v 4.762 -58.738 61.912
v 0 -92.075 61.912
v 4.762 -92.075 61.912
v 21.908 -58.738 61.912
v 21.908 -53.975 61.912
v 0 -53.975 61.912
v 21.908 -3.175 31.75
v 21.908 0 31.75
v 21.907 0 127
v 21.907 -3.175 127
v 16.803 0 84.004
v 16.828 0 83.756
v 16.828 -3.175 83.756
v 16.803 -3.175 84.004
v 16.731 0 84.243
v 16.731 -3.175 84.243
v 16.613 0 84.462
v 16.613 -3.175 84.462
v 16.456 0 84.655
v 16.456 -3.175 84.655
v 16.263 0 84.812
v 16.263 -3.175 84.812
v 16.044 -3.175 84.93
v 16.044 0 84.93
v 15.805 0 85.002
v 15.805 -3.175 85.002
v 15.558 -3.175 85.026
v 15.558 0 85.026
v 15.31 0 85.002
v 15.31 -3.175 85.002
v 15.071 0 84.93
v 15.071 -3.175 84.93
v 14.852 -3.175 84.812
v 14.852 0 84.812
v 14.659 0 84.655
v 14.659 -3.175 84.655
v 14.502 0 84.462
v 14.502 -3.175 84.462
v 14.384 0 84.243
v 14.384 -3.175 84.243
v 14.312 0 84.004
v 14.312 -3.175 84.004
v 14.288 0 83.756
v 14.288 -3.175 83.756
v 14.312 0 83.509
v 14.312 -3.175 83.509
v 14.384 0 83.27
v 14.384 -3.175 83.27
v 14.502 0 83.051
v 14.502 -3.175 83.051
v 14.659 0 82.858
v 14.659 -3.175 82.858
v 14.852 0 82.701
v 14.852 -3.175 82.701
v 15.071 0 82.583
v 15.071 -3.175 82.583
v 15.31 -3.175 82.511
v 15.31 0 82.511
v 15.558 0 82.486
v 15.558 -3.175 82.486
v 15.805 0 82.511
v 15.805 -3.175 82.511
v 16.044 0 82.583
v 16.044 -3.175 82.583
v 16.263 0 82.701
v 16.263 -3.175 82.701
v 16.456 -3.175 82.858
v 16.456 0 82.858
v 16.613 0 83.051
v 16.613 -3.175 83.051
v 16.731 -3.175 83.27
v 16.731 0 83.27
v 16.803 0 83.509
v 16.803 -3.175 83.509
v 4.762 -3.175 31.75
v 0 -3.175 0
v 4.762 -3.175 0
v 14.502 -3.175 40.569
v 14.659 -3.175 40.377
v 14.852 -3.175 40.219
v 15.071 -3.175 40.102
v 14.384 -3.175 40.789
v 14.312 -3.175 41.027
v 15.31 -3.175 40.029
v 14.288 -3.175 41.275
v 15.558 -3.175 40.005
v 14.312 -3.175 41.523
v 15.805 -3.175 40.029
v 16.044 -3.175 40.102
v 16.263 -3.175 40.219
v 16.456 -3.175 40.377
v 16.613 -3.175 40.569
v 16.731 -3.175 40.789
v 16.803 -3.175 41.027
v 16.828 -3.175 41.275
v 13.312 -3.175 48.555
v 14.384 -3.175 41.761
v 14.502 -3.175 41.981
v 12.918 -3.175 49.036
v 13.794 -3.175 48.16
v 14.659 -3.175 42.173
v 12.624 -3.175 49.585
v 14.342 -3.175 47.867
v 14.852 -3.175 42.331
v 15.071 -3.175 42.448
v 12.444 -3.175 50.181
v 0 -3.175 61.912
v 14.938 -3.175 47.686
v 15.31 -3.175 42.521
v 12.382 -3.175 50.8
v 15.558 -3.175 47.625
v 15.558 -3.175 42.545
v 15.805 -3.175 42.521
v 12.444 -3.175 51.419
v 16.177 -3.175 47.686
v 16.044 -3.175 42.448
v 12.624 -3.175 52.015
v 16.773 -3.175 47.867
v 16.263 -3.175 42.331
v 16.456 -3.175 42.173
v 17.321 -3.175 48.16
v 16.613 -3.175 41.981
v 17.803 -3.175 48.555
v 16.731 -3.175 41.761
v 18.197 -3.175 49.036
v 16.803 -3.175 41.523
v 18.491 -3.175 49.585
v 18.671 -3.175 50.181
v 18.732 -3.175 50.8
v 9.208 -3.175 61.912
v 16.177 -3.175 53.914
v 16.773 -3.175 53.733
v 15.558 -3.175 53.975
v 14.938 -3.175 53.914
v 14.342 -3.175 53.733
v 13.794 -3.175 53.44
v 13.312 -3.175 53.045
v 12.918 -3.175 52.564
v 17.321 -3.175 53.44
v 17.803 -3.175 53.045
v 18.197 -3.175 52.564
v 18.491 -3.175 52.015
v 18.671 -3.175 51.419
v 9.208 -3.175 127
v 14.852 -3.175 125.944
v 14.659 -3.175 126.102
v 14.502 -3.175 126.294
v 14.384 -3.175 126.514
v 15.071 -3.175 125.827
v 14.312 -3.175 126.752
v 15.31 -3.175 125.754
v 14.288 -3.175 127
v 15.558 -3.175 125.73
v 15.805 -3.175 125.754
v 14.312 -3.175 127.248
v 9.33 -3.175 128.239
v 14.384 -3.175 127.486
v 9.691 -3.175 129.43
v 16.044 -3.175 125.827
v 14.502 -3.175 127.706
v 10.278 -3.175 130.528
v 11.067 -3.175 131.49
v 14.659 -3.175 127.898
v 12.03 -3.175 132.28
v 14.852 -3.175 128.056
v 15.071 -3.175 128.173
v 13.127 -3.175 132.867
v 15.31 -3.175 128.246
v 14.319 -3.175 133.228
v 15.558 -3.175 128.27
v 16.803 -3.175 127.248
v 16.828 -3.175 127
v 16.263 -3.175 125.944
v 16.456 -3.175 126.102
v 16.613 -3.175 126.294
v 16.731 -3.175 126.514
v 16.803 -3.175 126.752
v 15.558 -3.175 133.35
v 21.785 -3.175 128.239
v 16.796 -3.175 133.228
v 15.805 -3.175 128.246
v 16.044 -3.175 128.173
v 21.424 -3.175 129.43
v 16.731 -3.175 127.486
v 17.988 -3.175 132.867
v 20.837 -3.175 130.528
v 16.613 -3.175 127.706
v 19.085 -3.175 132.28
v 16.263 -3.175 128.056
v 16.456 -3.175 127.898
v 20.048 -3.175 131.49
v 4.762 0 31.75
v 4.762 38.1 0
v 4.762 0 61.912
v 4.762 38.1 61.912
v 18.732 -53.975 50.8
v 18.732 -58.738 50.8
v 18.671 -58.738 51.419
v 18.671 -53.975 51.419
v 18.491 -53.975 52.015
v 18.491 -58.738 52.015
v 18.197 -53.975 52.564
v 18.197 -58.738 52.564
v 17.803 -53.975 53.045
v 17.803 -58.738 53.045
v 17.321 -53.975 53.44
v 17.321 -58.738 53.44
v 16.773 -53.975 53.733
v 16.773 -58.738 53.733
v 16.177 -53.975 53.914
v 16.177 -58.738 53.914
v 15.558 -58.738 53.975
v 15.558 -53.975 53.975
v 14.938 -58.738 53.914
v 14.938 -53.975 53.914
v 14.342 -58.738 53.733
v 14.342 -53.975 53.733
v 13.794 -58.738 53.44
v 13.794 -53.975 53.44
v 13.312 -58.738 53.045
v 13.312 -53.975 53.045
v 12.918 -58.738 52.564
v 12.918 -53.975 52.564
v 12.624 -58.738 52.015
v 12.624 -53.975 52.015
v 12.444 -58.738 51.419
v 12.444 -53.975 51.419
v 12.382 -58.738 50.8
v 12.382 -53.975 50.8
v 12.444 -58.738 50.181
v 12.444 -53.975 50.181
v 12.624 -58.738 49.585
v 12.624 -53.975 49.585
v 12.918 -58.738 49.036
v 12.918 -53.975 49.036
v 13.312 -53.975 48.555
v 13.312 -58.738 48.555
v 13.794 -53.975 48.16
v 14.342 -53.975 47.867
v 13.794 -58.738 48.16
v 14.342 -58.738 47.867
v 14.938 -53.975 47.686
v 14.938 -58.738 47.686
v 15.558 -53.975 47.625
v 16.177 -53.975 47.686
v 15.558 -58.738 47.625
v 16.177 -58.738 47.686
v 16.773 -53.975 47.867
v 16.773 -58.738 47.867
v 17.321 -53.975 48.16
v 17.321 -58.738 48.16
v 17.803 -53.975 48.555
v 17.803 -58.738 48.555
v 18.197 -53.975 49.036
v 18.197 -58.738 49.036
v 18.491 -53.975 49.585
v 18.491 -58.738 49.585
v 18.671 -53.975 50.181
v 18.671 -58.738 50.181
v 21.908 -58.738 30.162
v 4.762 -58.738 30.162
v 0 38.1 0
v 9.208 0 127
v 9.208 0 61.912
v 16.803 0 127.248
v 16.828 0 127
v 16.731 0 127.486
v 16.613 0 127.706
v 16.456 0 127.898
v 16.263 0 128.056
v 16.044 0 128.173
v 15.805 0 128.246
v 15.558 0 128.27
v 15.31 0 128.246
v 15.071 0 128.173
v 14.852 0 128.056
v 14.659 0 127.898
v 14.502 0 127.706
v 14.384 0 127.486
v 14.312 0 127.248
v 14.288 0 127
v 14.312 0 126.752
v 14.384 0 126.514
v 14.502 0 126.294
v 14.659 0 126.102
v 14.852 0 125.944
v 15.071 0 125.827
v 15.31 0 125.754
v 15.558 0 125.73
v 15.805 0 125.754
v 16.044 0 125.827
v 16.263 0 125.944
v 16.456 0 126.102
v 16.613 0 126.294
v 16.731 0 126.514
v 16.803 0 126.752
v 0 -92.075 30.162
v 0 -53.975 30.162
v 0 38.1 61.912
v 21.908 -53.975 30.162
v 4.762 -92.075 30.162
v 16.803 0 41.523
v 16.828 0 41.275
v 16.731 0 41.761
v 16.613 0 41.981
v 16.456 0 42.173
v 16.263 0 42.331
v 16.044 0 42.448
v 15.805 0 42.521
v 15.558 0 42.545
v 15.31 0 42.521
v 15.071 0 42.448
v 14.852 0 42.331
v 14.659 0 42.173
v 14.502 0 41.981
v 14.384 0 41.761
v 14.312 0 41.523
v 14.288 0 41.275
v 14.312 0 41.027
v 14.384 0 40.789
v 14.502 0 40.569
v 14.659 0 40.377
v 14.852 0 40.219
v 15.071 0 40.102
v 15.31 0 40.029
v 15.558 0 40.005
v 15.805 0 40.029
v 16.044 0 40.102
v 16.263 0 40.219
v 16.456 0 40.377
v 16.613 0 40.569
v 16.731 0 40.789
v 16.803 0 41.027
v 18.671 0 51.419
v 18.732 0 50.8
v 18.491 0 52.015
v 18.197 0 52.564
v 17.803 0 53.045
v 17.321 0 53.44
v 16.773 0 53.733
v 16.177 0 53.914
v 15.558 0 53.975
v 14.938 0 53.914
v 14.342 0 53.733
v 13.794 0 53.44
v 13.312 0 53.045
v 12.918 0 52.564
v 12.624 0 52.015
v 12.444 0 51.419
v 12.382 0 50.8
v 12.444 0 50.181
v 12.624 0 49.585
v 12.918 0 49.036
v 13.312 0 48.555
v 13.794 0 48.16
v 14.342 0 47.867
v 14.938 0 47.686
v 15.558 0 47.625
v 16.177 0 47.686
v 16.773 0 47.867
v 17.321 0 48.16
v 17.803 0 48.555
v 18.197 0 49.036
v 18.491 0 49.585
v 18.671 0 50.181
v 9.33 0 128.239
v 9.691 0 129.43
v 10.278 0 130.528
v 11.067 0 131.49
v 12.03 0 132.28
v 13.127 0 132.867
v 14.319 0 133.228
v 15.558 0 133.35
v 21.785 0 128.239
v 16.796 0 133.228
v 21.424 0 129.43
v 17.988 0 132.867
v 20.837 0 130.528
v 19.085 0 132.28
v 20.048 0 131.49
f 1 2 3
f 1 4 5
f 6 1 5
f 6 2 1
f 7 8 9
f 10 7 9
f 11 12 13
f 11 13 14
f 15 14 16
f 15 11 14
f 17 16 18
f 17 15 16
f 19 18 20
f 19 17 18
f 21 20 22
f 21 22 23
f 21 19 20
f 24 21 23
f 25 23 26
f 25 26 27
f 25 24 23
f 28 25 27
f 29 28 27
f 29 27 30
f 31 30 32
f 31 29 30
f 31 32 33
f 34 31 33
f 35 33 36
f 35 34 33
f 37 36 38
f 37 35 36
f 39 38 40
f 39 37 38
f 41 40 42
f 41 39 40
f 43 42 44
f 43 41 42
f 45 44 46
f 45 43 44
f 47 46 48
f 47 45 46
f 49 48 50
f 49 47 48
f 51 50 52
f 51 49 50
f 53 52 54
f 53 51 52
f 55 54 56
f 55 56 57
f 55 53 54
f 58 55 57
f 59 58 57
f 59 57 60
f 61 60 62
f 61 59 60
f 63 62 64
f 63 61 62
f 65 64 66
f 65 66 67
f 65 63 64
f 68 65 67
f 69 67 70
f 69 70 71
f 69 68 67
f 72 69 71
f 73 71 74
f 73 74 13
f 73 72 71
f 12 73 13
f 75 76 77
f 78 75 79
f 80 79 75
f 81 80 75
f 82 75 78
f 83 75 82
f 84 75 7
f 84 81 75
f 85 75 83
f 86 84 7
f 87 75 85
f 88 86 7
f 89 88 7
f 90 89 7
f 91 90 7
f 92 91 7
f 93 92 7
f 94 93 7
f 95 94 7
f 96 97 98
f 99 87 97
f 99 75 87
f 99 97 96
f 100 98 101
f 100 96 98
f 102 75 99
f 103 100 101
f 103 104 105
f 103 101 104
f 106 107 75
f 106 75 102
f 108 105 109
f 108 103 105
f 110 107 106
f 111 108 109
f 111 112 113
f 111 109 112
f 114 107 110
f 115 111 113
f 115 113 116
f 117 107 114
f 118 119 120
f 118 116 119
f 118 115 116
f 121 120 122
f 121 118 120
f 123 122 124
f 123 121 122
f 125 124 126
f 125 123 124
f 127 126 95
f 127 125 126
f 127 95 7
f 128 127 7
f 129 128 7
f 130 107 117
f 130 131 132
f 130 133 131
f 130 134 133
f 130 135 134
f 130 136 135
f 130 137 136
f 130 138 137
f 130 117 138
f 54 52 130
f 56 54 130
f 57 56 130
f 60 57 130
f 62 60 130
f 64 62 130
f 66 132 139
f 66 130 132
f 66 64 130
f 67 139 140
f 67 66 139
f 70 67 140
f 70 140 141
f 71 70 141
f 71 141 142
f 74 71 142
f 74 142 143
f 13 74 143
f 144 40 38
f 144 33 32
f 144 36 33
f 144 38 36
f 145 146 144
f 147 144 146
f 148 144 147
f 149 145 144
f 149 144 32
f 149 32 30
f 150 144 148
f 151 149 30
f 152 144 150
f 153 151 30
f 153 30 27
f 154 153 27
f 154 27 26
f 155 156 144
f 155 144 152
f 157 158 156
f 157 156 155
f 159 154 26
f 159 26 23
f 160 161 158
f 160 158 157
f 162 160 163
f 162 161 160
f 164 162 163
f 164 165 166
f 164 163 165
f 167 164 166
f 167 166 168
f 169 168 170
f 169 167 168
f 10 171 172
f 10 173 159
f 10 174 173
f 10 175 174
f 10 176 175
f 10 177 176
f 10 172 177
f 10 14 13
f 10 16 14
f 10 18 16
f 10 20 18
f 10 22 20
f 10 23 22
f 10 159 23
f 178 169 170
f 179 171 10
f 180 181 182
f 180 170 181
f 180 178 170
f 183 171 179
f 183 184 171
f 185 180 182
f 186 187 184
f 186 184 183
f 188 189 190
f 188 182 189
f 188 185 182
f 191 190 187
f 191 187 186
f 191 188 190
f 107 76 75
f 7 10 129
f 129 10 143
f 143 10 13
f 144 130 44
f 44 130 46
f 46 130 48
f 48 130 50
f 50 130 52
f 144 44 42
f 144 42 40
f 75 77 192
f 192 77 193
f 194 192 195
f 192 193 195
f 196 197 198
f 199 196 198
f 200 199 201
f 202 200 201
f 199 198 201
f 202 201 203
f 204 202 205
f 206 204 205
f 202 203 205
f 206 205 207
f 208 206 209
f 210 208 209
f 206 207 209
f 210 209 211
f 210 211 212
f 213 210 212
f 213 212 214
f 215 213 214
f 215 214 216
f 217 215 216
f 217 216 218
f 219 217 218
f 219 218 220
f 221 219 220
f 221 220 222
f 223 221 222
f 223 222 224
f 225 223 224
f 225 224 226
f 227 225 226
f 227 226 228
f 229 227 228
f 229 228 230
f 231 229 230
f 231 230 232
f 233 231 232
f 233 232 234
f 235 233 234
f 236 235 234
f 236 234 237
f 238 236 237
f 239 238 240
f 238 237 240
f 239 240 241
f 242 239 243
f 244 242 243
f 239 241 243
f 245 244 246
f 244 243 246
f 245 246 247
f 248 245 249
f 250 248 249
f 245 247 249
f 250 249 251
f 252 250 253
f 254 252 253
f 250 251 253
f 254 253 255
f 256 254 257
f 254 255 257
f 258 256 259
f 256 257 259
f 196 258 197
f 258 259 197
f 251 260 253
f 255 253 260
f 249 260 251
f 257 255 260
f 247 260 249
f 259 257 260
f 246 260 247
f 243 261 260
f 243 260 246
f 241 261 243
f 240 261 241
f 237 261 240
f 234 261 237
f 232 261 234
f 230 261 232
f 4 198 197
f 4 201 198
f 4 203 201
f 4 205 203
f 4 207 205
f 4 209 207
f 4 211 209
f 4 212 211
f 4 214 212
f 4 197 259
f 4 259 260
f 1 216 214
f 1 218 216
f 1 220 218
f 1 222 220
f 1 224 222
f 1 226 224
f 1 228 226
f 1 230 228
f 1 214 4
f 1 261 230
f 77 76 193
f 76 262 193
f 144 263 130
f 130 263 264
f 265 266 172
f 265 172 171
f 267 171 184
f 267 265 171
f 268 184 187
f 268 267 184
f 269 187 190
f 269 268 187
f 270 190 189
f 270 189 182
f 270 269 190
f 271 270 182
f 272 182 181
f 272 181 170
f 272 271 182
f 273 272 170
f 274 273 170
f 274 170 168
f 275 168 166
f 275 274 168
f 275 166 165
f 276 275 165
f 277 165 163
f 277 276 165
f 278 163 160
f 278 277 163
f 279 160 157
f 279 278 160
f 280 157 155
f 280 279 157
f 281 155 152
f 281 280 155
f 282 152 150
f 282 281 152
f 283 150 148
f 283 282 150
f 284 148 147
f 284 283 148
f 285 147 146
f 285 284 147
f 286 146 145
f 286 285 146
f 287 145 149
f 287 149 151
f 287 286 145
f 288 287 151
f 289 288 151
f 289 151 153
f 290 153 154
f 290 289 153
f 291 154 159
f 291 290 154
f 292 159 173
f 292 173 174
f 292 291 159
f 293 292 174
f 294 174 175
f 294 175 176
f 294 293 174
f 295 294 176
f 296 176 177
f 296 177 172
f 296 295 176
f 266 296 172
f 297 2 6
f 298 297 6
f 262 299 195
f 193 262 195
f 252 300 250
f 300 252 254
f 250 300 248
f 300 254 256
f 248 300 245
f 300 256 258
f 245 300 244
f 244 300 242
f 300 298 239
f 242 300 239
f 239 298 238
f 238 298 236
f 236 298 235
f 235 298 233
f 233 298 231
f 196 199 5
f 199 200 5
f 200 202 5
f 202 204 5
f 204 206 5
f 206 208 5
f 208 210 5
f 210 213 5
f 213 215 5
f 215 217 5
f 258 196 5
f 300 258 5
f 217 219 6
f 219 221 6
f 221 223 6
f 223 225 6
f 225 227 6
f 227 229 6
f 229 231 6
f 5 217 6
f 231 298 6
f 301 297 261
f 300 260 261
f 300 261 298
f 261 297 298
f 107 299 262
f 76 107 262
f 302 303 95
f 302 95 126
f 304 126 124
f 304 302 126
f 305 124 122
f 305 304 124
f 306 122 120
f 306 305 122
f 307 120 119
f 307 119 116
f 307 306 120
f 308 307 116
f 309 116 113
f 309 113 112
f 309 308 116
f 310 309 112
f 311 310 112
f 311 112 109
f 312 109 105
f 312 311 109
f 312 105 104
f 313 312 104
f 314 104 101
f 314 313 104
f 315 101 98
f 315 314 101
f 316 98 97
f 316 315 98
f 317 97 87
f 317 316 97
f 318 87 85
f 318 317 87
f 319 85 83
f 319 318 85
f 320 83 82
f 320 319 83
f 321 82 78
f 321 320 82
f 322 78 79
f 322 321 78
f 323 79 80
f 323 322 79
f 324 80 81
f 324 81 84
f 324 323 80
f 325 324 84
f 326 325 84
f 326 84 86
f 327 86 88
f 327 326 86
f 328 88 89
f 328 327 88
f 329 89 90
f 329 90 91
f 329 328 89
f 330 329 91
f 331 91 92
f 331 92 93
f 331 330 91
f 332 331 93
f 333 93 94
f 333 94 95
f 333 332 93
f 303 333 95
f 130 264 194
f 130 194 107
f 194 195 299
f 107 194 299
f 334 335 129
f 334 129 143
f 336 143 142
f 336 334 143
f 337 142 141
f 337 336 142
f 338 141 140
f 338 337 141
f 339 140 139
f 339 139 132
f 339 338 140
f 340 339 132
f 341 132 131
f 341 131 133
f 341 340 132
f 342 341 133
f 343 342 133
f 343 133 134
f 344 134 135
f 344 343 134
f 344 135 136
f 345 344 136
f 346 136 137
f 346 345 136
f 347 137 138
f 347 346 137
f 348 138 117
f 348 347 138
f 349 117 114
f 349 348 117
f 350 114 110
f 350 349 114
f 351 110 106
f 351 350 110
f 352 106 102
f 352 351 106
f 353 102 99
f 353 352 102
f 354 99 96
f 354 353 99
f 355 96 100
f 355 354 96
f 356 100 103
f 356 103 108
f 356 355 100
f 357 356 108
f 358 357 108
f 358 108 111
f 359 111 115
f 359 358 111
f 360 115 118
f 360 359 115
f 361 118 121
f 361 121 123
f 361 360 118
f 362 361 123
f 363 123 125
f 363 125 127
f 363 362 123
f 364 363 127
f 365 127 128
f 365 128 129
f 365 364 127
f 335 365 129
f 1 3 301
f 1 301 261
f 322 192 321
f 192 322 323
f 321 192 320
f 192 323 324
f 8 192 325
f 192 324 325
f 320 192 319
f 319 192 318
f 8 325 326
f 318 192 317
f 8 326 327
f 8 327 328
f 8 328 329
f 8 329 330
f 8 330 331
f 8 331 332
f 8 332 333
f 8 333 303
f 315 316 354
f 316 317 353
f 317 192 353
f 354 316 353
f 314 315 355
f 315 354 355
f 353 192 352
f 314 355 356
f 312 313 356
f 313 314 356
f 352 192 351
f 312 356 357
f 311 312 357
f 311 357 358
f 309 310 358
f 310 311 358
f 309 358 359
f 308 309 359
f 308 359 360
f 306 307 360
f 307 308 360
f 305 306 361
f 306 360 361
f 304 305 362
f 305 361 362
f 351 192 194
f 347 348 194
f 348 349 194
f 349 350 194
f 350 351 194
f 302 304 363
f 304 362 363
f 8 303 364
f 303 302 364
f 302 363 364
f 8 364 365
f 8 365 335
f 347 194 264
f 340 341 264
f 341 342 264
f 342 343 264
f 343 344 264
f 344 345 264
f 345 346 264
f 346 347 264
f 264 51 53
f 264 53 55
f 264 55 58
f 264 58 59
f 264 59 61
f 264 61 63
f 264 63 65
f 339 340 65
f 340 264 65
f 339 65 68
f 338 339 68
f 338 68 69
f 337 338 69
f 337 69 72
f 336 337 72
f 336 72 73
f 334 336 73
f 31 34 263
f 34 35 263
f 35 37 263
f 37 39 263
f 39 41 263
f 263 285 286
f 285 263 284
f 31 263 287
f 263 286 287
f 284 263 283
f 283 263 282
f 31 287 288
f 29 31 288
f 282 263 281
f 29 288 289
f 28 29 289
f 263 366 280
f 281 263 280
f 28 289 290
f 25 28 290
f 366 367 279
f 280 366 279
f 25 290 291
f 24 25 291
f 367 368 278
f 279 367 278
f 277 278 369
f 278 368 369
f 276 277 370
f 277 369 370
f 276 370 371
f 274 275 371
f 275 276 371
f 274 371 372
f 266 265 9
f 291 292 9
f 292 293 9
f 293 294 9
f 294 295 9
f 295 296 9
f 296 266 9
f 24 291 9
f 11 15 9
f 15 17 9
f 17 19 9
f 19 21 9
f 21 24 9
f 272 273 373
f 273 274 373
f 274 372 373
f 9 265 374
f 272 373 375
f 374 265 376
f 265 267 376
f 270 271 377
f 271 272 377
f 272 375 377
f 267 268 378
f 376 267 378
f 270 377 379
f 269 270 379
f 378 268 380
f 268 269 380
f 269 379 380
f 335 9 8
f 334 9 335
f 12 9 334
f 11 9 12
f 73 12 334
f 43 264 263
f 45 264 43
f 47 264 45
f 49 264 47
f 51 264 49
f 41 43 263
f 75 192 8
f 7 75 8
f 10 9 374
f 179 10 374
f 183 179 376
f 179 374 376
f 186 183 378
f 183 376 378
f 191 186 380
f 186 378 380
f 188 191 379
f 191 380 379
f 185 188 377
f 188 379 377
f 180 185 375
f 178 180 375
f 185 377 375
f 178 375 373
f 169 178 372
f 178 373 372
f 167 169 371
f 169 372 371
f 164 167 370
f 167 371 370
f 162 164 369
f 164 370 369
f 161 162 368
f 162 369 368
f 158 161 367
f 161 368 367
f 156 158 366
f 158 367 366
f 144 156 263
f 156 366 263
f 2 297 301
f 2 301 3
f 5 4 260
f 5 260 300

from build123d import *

# Parameters (mm, degrees)
F1_DEPTH = 38.1
F0_R     = 1.27
F0_R_2   = 3.175
F2_DEPTH = 3.175
F3_W     = 4.7625
F3_H     = 31.75
F4_DEPTH = 21.9075
F3_W_2   = 33.3375
F5_DEPTH = 4.7625
F6_R     = 3.175
F7_DEPTH = 25.4


with BuildPart() as f1:
    # F0 (on Front) → F1 (new body)
    with BuildSketch(Plane.XZ):
        Polygon((0, 61.9125), (0, 0), (4.7625, 0), (4.7625, 31.75), (4.7625, 61.9125), align=None)
    extrude(amount=-F1_DEPTH)

    # F0 (on Front) → F2 (join)
    with BuildSketch(Plane.XZ):
        Polygon((0, 61.9125), (0, 0), (4.7625, 0), (4.7625, 31.75), (4.7625, 61.9125), align=None)
        with BuildLine():
            Line((4.7625, 61.9125), (4.7625, 31.75))
            Line((4.7625, 31.75), (21.9075, 31.75))
            Line((21.9075, 31.75), (21.9075, 127))
            ThreePointArc((21.9075, 127), (15.5575, 133.35), (9.2075, 127))
            Line((9.2075, 127), (9.2075, 61.9125))
            Line((9.2075, 61.9125), (4.7625, 61.9125))
        make_face()
        with Locations((15.5575, 41.275)):
            Circle(F0_R, mode=Mode.SUBTRACT)
        with Locations((15.5575, 50.8)):
            Circle(F0_R_2, mode=Mode.SUBTRACT)
        with Locations((15.5575, 83.7565)):
            Circle(F0_R, mode=Mode.SUBTRACT)
        with Locations((15.5575, 127)):
            Circle(F0_R, mode=Mode.SUBTRACT)
    extrude(amount=F2_DEPTH)


with BuildPart() as f4:
    # F3 (on Right) → F4 (new body)
    with BuildSketch(Plane.YZ):
        with Locations((-56.35625, 46.0375)):
            Rectangle(F3_W, F3_H)
    extrude(amount=F4_DEPTH)

    # F3 (on Right) → F5 (join)
    with BuildSketch(Plane.YZ):
        with Locations((-75.40625, 46.0375)):
            Rectangle(F3_W_2, F3_H)
    extrude(amount=F5_DEPTH)

    # F6 (on face) → F7 (cut)
    with BuildSketch(Plane.XZ.offset(58.7375)):
        with Locations((15.5575, 50.8)):
            Circle(F6_R)
    extrude(amount=-F7_DEPTH, mode=Mode.SUBTRACT)


solid = Compound([f1.part, f4.part])
